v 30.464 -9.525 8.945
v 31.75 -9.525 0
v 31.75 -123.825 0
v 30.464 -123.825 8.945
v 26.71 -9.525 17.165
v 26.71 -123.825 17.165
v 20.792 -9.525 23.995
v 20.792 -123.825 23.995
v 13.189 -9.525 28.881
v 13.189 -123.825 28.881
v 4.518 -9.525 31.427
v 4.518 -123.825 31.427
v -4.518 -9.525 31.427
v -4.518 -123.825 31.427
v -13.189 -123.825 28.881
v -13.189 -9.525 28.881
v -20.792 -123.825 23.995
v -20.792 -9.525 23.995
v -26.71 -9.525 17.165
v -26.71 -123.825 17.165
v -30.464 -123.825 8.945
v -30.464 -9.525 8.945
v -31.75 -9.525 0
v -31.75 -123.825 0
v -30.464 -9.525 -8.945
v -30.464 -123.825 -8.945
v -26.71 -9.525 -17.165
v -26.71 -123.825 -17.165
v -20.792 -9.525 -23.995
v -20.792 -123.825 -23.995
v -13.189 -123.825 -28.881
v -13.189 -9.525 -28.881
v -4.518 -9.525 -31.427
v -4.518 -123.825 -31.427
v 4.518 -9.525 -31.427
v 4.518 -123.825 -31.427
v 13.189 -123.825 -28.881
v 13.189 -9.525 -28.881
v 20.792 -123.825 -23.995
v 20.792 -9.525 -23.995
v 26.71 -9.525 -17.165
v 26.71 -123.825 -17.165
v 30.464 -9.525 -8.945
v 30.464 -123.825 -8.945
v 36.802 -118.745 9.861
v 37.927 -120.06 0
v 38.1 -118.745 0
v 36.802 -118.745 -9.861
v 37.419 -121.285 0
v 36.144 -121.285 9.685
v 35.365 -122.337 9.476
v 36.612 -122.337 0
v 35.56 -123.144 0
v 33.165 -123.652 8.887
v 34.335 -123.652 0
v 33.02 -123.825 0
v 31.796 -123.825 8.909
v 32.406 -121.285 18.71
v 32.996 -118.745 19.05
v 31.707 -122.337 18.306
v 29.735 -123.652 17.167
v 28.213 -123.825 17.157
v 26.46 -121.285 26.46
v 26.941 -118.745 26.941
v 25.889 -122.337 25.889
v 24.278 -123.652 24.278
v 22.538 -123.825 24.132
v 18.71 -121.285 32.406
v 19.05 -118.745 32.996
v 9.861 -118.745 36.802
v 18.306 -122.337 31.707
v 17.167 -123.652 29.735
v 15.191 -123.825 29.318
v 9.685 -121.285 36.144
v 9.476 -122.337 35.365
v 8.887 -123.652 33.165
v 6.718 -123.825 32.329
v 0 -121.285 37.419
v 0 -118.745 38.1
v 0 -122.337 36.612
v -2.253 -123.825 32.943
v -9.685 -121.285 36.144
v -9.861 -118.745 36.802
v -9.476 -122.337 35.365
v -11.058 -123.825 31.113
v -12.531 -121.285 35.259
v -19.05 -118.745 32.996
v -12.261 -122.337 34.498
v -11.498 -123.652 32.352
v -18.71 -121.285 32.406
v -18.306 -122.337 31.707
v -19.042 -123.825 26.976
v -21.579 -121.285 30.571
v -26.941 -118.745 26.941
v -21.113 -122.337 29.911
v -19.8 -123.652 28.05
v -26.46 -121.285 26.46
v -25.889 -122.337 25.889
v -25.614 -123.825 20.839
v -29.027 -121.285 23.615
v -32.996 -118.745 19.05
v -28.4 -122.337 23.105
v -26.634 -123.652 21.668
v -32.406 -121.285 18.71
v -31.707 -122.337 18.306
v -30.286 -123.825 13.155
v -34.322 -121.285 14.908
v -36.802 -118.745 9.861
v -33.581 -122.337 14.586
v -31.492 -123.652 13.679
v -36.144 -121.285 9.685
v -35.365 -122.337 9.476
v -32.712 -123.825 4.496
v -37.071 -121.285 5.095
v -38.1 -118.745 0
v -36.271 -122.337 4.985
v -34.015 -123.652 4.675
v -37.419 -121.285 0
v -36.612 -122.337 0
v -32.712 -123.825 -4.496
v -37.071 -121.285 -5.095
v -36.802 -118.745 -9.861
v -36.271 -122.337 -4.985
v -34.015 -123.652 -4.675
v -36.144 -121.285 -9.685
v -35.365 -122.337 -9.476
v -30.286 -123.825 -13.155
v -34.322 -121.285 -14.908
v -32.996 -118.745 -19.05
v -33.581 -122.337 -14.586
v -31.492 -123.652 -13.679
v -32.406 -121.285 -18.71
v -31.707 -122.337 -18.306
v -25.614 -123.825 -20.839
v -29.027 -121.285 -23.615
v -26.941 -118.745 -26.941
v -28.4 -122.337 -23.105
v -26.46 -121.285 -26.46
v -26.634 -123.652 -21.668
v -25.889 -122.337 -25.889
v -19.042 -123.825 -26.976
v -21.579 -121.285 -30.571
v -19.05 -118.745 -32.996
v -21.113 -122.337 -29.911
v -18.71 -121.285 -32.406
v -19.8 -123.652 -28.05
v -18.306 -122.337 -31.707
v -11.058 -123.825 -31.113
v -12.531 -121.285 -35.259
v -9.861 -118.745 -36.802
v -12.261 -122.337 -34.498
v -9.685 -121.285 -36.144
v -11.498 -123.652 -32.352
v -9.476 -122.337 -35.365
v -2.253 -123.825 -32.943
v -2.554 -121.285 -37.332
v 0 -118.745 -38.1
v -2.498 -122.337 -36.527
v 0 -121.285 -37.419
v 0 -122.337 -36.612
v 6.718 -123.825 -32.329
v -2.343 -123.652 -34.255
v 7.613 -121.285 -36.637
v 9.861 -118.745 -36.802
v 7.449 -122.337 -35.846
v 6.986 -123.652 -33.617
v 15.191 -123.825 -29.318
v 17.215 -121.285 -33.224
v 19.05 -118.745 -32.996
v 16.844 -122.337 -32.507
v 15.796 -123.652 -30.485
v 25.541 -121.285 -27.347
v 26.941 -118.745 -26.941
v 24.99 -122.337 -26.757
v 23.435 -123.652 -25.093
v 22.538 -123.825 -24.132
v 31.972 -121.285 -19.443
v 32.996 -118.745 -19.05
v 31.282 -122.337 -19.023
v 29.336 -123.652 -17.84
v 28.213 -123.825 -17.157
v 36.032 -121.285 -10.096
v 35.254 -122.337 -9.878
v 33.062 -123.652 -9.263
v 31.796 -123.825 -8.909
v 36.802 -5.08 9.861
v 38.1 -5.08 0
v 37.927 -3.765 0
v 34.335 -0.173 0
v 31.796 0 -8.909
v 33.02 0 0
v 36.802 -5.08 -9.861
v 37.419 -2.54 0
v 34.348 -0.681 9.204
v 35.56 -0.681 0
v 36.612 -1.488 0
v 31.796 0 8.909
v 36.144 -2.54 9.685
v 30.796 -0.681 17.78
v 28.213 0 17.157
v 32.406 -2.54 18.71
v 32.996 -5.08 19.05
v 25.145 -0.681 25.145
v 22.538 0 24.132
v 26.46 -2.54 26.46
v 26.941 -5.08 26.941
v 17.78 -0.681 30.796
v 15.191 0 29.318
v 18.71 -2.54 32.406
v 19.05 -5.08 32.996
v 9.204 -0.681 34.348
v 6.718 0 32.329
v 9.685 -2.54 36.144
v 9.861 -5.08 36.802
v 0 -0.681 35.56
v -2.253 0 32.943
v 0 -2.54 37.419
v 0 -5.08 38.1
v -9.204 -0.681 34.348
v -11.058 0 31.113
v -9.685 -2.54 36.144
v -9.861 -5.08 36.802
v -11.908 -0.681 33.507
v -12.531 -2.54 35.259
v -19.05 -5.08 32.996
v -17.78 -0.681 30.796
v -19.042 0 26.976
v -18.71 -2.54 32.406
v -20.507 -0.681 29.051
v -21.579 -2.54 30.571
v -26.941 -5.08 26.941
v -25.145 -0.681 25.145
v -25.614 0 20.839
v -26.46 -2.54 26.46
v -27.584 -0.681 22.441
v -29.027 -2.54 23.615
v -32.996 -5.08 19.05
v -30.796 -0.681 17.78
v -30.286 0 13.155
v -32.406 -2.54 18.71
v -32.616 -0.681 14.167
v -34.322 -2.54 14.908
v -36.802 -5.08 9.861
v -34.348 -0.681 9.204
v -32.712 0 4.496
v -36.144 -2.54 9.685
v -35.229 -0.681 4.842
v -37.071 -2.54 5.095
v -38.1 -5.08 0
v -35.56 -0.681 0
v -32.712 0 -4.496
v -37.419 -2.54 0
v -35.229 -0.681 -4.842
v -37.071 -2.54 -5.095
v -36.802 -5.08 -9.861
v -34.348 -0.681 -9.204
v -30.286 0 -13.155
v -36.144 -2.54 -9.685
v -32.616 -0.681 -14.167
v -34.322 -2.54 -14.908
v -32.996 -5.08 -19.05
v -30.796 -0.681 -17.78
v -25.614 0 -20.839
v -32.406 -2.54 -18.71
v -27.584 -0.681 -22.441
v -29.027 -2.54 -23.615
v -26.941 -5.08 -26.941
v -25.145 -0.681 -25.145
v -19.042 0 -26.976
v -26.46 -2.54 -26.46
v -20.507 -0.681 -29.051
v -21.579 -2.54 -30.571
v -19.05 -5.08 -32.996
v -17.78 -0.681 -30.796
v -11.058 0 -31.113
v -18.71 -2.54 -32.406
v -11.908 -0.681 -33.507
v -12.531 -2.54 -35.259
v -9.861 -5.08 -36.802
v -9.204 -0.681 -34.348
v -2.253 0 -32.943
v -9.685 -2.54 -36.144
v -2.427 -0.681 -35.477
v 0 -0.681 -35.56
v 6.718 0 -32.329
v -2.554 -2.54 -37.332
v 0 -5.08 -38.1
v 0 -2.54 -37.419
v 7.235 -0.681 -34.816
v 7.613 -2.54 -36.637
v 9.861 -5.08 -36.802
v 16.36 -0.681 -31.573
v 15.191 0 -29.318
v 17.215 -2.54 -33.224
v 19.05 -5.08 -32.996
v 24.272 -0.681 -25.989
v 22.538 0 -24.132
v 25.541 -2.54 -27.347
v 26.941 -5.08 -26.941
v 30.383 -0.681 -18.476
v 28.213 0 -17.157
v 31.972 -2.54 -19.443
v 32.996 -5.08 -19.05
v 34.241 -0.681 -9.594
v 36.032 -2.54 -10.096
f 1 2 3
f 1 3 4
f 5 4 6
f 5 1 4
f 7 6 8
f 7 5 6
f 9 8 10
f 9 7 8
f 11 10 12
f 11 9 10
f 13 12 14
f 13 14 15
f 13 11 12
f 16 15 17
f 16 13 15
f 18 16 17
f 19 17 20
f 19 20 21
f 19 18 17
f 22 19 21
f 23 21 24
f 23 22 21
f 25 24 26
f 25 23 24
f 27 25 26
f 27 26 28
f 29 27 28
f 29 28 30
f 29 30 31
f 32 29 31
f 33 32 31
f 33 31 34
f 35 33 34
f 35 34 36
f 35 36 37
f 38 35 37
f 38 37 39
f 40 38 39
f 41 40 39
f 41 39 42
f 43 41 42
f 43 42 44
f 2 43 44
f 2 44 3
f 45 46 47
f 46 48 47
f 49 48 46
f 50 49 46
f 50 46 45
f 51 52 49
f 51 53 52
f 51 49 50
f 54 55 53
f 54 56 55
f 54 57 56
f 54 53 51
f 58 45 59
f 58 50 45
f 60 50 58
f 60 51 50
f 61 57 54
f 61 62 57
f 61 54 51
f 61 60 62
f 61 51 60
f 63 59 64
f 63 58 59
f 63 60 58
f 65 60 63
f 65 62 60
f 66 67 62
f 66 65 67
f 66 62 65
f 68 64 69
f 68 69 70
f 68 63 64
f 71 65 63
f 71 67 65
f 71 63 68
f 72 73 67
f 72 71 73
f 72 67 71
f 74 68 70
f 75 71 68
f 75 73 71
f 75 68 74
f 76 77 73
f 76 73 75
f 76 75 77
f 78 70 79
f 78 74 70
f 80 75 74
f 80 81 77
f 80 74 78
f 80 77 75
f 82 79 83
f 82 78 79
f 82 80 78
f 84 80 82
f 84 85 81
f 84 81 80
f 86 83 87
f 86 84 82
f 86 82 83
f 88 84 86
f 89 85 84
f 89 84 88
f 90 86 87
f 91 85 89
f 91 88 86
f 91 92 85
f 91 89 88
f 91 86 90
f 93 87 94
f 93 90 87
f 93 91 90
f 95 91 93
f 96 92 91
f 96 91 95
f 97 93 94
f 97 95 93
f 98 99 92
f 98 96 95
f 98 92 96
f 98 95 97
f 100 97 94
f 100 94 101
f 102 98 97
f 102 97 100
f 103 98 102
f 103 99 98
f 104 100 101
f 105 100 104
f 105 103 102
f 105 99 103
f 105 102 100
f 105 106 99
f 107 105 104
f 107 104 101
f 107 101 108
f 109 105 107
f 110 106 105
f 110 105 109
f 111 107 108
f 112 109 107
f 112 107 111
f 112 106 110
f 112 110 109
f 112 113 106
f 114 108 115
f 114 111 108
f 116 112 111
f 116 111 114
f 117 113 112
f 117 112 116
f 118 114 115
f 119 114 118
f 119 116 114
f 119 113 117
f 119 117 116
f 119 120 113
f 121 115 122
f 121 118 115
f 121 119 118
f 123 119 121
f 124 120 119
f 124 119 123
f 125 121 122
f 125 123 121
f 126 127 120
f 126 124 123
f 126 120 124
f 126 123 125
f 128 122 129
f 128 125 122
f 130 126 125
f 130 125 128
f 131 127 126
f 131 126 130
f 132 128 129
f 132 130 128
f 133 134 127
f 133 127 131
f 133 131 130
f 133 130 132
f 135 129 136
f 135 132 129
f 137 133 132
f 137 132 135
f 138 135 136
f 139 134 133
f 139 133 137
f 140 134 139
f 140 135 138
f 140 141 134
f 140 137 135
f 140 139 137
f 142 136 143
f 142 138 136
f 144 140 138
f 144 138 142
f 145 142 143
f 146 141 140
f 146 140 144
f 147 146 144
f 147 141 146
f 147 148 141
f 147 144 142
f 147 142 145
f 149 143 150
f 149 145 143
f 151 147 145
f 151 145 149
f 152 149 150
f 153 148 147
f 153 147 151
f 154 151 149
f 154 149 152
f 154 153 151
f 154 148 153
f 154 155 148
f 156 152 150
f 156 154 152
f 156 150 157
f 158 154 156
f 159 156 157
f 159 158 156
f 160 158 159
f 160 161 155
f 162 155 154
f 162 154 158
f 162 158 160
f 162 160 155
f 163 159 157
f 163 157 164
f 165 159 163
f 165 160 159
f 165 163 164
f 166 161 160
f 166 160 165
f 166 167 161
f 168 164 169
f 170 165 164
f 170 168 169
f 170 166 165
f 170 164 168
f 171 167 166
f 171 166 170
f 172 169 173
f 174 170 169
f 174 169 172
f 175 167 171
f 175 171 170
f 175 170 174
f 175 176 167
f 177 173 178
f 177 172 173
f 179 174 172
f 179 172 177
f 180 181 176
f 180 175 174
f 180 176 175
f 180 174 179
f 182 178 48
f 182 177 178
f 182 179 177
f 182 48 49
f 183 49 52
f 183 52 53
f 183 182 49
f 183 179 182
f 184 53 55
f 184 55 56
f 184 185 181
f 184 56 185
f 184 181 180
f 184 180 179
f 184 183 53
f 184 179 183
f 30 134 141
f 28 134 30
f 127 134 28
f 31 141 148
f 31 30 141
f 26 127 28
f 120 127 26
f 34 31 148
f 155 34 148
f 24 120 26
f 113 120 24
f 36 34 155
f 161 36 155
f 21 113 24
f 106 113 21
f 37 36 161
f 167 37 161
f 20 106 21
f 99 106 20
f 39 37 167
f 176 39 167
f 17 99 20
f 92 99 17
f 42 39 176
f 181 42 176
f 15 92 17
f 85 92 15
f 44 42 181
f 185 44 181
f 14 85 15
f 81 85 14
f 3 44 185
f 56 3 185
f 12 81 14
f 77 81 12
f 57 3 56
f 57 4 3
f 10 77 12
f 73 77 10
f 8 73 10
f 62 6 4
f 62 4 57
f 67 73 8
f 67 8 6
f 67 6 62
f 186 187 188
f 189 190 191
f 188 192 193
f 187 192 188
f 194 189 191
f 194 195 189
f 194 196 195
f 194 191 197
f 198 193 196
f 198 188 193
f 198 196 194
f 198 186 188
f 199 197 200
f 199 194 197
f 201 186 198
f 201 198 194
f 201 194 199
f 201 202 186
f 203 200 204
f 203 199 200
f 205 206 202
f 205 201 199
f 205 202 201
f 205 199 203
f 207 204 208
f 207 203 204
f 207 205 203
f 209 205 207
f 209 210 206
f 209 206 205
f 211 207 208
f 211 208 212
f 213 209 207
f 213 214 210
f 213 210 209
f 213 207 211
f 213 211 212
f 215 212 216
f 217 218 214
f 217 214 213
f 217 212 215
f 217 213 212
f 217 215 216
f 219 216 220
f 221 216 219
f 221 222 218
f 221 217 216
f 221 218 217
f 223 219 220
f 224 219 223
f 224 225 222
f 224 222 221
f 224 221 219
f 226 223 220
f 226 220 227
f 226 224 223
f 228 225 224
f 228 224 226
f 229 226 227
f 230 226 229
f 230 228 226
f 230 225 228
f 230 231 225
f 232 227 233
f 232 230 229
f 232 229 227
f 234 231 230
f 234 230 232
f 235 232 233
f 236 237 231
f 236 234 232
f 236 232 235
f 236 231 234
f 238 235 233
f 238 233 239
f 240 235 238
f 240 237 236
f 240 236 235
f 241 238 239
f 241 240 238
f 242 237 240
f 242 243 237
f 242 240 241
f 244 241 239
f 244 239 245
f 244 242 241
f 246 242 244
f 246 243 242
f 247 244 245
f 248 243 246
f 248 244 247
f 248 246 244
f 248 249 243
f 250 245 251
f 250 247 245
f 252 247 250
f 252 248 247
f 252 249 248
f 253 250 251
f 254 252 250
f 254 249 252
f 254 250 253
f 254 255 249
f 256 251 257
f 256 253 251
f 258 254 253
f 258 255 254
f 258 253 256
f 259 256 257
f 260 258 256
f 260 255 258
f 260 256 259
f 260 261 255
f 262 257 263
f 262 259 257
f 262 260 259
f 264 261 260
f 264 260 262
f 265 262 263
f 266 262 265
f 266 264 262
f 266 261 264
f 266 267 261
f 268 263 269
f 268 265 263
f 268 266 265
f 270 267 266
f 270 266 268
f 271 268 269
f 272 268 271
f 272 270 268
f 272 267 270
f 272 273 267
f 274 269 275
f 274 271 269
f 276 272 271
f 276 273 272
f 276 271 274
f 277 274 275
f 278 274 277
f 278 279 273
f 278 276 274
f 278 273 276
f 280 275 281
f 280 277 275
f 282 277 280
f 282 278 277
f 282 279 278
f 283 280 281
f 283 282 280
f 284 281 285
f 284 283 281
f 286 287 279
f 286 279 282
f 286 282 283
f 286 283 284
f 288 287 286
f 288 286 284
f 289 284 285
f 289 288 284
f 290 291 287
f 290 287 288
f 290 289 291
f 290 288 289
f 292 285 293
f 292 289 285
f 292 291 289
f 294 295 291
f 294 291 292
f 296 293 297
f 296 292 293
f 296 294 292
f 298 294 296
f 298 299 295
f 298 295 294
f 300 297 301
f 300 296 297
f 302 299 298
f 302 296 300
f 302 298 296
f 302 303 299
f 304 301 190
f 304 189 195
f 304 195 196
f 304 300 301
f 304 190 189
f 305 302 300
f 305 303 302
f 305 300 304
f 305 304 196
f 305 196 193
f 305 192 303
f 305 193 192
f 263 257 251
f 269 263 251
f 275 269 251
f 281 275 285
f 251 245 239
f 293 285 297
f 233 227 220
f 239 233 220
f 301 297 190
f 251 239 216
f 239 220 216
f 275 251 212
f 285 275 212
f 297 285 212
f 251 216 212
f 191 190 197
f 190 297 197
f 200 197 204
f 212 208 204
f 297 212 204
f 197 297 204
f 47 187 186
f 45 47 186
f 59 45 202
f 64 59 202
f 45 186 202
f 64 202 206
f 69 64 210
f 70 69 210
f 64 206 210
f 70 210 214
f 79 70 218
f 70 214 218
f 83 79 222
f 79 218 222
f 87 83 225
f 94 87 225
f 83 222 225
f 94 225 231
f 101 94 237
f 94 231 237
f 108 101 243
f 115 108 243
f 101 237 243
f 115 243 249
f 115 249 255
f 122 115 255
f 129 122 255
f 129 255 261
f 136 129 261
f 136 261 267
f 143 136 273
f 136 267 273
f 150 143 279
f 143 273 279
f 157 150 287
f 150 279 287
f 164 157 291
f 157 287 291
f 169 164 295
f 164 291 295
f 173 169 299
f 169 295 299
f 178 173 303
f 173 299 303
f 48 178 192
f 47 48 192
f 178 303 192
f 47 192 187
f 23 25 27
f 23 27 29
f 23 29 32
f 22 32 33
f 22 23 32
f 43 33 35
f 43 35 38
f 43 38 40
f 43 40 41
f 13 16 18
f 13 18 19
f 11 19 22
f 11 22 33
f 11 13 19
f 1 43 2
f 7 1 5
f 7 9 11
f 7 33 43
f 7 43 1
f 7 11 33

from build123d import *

# Parameters (mm, degrees)
F0_R     = 38.1
F0_R_2   = 31.75
F1_DEPTH = 123.825
F2_R     = 31.75
F3_DEPTH = 9.525
F4_R     = 5.08


with BuildPart() as f1:
    # F0 (on Front) → F1 (new body)
    with BuildSketch(Plane.XZ):
        Circle(F0_R)
        Circle(F0_R_2, mode=Mode.SUBTRACT)
    extrude(amount=F1_DEPTH)

    # F2 (on Front) → F3 (join)
    with BuildSketch(Plane.XZ):
        Circle(F2_R)
    extrude(amount=F3_DEPTH)

    # F4
    f4_edges = [f1.edges().sort_by_distance(p)[0] for p in [
        (-38.1, -123.825, 0),
        (38.1, -61.9125, 0),
        (-38.1, 0, 0),
    ]]
    fillet(f4_edges, radius=F4_R)


solid = f1.part
